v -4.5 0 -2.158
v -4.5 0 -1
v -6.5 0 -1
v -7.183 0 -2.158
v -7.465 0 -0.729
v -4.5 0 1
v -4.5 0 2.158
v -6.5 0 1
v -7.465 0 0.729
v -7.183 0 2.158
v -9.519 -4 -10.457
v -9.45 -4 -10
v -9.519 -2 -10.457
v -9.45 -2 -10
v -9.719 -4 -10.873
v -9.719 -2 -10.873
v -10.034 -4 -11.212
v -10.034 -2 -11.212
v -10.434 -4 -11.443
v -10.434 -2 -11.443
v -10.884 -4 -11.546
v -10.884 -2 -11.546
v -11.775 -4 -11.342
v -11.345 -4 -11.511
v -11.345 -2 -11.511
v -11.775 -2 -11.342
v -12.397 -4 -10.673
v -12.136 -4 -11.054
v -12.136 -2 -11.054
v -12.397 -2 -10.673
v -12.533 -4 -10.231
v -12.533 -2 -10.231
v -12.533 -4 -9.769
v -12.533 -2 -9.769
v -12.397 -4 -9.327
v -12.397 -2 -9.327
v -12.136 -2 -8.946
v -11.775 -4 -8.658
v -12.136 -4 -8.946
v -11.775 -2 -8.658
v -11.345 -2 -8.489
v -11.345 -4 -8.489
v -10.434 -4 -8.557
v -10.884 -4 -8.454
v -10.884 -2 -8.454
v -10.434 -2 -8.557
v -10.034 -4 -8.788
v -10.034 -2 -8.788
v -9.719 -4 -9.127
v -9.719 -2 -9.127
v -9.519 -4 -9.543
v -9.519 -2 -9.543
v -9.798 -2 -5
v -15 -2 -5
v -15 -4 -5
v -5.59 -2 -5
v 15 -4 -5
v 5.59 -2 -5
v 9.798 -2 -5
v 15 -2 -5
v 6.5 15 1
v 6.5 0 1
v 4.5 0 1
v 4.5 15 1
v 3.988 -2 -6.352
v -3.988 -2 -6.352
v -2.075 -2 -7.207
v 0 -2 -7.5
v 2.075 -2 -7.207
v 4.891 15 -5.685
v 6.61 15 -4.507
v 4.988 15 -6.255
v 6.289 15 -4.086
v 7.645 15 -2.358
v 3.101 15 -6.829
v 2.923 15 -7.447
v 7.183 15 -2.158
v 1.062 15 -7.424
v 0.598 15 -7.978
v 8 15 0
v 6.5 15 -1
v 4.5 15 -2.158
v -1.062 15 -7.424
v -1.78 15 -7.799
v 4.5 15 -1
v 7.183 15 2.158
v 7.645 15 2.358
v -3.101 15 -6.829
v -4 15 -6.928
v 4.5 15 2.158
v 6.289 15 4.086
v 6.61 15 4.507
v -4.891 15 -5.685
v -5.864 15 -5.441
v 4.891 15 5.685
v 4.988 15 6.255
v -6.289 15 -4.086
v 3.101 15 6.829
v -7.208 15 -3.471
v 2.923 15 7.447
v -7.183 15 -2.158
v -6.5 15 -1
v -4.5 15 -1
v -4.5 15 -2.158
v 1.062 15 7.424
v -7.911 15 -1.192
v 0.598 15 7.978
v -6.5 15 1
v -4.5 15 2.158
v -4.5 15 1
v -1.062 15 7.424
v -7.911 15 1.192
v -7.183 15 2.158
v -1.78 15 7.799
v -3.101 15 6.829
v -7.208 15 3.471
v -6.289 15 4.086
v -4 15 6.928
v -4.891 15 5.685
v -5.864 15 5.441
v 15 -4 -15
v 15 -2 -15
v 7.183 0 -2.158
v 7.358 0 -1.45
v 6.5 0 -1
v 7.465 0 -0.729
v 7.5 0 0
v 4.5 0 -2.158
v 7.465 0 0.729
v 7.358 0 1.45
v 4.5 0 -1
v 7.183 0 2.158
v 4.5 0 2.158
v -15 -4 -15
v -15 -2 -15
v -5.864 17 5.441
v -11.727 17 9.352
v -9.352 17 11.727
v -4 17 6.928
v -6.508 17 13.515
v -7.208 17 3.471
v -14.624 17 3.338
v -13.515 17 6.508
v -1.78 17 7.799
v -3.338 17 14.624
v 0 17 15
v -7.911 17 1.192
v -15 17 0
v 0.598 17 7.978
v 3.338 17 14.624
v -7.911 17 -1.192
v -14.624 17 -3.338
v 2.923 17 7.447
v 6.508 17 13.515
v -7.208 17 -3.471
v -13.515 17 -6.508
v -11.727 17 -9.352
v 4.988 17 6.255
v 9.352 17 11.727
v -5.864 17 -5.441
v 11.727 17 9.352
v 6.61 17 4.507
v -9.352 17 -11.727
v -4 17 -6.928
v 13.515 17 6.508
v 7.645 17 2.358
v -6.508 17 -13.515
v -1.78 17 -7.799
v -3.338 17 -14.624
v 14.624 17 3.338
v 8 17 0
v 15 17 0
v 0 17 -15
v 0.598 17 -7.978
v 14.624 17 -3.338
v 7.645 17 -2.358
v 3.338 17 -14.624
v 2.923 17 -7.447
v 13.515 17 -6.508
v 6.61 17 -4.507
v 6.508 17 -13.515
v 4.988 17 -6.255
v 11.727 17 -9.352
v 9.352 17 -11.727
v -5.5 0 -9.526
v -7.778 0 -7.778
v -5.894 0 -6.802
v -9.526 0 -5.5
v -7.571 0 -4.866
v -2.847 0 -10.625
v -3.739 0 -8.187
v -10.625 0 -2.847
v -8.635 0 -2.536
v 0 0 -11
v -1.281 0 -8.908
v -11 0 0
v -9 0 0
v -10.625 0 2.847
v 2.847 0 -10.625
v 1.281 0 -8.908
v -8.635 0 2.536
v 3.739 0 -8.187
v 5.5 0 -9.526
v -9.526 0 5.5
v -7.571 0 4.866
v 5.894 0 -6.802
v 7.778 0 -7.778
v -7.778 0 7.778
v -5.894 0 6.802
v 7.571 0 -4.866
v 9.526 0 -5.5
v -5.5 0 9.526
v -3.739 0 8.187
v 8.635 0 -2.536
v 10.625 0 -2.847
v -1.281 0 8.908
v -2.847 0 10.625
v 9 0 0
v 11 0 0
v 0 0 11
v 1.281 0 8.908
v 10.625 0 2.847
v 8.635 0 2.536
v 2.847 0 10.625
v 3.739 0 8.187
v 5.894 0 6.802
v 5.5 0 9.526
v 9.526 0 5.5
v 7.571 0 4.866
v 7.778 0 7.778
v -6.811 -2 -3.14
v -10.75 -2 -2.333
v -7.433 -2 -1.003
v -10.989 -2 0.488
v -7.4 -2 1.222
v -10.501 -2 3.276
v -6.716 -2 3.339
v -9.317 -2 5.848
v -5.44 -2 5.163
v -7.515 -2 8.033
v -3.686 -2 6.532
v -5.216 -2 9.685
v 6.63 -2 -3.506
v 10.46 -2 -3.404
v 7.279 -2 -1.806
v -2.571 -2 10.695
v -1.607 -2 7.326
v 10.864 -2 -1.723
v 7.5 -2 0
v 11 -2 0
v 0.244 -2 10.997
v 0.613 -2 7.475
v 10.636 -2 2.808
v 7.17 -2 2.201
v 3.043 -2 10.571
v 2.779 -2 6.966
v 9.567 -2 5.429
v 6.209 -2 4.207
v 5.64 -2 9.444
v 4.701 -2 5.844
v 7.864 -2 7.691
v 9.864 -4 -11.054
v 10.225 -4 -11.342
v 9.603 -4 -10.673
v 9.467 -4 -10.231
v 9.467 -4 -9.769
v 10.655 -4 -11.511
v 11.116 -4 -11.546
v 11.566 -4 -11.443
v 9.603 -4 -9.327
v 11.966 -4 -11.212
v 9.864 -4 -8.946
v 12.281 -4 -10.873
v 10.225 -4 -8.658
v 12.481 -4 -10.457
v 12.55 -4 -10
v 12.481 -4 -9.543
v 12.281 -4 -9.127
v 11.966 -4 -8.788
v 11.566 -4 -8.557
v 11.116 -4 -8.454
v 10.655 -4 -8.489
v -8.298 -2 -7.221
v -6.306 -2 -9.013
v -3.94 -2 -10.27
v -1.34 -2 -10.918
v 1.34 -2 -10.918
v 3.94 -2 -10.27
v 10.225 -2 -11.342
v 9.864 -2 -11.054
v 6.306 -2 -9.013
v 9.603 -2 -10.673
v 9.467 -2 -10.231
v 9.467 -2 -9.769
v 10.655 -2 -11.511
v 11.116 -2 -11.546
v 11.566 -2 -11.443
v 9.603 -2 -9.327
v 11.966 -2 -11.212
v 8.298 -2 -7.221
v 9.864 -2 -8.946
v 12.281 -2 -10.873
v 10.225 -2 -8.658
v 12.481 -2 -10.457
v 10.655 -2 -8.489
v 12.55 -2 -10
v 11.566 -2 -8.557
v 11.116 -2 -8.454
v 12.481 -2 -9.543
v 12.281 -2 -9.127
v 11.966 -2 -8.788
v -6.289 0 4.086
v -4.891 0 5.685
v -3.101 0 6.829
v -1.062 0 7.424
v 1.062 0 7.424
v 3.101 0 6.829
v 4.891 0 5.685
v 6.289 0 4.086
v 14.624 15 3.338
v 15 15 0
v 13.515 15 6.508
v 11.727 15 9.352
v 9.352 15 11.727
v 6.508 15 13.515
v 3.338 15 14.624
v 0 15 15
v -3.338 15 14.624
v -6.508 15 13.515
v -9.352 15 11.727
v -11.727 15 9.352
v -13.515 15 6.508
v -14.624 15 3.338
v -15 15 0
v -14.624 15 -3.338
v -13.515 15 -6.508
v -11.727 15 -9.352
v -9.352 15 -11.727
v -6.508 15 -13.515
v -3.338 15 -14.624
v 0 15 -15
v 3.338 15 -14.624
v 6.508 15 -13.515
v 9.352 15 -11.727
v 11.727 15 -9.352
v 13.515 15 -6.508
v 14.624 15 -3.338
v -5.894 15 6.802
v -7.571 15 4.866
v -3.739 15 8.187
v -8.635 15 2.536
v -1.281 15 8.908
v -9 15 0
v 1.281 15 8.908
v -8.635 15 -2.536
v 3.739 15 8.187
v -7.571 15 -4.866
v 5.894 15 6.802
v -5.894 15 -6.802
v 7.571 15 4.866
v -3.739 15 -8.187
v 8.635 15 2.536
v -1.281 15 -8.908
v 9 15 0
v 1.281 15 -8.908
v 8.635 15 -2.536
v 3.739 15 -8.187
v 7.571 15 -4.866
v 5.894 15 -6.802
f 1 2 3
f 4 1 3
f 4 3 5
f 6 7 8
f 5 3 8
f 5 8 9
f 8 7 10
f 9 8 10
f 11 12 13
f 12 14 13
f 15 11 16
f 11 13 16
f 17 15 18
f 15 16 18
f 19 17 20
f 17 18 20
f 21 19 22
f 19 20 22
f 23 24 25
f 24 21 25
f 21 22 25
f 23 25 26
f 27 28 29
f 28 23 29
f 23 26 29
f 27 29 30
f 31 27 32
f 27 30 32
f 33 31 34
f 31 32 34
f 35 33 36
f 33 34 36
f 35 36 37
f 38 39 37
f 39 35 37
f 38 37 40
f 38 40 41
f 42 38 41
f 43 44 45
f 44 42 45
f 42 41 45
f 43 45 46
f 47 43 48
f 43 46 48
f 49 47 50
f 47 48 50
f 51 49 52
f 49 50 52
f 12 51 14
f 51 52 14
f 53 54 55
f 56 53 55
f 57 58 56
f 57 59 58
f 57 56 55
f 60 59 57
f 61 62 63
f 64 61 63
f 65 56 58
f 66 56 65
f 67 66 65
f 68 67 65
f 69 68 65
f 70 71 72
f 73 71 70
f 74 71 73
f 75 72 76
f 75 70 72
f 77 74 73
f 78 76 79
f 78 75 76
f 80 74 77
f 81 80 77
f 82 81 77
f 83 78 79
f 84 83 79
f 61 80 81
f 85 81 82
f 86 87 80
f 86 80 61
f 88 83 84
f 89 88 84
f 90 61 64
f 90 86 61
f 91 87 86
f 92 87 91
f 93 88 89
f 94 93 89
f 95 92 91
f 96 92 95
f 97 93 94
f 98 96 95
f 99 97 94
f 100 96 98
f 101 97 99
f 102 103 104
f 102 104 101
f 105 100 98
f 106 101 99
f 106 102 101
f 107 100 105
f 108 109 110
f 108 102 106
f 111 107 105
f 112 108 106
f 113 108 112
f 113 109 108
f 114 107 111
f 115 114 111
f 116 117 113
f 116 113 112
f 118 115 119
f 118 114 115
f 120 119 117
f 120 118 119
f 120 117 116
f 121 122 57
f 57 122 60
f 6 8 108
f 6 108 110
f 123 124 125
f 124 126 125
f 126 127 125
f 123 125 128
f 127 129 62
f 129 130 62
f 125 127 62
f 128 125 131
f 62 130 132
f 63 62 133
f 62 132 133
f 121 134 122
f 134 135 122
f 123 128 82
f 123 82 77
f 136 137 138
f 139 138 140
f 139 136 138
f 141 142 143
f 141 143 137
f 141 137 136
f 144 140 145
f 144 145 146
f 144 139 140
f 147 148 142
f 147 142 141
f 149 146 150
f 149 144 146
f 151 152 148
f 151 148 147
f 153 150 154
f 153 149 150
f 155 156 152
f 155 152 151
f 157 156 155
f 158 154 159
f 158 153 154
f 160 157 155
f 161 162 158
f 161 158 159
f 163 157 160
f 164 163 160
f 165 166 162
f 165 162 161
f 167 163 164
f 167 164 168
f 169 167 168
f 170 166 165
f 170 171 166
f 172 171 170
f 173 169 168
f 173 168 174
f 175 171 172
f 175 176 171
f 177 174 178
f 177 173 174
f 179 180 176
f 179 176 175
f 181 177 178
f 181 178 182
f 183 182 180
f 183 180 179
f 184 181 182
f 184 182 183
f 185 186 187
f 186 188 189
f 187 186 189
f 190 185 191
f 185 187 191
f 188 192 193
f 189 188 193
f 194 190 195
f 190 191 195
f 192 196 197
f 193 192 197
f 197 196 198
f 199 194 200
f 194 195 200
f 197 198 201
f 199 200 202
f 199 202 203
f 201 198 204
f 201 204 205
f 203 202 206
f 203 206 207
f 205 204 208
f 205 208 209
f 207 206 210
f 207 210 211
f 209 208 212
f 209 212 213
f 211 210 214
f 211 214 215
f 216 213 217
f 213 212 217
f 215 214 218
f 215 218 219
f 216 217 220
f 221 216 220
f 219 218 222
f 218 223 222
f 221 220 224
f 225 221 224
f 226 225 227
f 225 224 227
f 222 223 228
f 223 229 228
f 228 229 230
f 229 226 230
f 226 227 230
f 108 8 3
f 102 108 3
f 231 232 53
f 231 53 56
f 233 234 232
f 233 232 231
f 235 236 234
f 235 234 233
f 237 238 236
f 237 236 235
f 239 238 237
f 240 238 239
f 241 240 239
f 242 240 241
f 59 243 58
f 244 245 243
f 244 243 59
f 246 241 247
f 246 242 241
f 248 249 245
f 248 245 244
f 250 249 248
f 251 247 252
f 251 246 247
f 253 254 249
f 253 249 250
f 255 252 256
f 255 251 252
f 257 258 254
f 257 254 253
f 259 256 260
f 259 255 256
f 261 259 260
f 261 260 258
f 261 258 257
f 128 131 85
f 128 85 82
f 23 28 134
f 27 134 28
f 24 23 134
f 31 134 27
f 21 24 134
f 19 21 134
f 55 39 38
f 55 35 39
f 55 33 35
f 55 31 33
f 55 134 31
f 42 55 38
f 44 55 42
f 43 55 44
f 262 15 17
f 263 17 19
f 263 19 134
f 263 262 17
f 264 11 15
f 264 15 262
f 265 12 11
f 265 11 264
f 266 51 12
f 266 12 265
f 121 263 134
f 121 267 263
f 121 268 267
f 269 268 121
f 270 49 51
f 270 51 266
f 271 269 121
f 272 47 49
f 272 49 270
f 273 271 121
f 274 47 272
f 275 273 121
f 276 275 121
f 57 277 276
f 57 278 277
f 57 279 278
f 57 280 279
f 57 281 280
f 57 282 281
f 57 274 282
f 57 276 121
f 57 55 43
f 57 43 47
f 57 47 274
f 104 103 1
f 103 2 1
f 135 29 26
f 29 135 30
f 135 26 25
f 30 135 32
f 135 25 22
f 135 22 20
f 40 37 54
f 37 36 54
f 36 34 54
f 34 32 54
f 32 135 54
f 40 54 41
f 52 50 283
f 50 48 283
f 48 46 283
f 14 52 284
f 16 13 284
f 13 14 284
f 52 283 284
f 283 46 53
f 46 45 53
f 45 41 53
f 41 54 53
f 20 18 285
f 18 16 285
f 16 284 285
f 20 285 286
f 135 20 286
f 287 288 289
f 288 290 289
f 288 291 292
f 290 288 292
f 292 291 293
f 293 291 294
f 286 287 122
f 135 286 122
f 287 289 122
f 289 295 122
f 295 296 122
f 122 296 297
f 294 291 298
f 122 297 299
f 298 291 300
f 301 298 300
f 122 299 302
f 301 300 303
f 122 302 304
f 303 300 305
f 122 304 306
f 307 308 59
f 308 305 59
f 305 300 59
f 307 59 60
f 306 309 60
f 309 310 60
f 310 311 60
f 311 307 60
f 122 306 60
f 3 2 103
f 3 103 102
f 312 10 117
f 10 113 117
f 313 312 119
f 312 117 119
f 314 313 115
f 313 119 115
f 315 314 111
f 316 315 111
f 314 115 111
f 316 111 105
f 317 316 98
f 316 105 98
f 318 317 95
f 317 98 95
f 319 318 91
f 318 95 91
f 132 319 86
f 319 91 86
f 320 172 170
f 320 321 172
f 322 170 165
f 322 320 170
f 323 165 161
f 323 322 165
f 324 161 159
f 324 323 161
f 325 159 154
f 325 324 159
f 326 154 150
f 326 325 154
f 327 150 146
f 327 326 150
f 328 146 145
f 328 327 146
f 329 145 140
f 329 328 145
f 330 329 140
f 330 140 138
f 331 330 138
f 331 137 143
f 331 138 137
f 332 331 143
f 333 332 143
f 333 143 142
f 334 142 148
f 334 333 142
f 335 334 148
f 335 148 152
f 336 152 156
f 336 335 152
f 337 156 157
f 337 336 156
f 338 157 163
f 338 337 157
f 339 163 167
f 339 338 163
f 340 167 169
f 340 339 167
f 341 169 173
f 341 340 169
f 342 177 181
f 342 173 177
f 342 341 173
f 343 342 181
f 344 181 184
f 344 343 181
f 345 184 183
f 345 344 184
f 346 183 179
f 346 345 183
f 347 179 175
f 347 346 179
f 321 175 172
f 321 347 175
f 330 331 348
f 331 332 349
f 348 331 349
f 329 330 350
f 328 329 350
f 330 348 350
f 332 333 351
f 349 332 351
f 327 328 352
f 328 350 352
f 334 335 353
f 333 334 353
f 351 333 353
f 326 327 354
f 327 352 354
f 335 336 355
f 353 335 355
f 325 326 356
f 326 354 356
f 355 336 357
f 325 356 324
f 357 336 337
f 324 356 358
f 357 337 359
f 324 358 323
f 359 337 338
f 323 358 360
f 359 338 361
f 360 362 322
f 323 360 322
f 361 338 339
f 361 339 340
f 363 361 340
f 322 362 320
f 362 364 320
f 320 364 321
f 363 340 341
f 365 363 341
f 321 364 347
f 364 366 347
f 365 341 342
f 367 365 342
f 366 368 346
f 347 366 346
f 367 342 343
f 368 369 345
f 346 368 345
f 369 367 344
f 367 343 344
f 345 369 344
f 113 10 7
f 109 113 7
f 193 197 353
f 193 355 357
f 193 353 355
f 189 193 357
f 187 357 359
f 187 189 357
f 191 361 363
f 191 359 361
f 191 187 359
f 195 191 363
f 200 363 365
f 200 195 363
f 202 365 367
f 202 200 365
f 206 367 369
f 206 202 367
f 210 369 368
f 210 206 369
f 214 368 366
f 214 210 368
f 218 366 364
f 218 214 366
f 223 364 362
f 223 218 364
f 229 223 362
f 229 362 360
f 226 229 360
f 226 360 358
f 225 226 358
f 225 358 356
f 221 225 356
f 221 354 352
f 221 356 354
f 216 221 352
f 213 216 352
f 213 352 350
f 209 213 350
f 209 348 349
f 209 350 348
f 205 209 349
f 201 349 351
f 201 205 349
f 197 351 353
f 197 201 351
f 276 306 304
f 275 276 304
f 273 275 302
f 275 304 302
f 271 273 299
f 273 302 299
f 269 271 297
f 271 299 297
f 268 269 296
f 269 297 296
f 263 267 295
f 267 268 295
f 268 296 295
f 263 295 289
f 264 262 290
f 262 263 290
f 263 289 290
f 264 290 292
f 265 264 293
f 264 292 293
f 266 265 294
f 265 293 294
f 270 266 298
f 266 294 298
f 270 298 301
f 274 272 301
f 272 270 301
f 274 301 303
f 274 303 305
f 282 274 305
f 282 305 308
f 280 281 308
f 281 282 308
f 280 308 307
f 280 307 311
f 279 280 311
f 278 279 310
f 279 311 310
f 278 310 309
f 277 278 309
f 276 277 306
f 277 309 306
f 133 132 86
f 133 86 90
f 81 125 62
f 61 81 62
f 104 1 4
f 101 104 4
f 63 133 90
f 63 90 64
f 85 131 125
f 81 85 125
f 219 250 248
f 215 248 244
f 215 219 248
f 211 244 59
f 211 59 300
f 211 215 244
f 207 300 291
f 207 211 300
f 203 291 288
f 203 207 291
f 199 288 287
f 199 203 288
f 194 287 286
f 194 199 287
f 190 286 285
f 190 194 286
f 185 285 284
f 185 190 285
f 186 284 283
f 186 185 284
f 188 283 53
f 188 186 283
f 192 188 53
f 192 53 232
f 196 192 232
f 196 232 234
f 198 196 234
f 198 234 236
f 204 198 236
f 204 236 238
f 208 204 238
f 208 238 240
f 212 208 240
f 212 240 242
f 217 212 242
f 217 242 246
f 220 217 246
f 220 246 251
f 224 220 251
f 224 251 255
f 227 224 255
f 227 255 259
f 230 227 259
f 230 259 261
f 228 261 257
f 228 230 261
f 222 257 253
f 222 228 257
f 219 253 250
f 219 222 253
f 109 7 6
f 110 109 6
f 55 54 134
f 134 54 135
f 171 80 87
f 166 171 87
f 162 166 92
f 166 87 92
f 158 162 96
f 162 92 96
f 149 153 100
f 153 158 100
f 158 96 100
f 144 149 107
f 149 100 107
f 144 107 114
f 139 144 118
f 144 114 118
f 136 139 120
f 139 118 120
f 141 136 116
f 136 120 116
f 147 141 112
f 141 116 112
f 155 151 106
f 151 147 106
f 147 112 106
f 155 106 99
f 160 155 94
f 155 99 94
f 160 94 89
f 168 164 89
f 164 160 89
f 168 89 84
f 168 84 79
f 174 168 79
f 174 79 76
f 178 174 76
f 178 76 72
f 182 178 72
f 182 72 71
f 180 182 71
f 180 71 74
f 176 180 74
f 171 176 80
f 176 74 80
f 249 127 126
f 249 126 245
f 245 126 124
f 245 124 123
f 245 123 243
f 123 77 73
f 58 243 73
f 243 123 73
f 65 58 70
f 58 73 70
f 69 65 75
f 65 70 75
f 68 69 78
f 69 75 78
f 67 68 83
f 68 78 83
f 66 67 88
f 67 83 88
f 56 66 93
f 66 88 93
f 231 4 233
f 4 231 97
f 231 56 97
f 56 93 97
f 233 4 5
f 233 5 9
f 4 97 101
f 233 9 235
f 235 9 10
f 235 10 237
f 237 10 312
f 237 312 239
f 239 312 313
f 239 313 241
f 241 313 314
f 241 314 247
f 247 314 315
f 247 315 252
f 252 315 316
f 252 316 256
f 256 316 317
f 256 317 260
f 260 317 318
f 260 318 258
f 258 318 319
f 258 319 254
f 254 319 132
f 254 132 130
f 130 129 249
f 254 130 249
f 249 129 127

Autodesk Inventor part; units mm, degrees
ref_plane "YZ Plane" through (0, 0, 0) normal (1, 0, 0) x (0, 1, 0)
ref_plane "XZ Plane" through (0, 0, 0) normal (0, 1, 0) x (-1, 0, 0)
ref_plane "XY Plane" through (0, 0, 0) normal (0, 0, 1) x (1, 0, 0)
sketch "草圖1" plane through (0, 0, 0) normal (0, 1, 0) x (-1, 0, 0)
  circle A0 centre (0, 0) radius 7.5
  circle A1 centre (0, 0) radius 9
  line L0 (7.5, 2.1585) -> (4.5, 2.1585)
  line L1 (4.5, 2.1585) -> (4.5, -2.1585)
  line L2 (4.5, -2.1585) -> (7.5, -2.1585)
  line L3 (7.5, -2.1585) -> (7.5, 2.1585)
  line L4 (7, 1) -> (4.5, 1)
  line L5 (4.5, 1) -> (4.5, -1)
  line L6 (4.5, -1) -> (7, -1)
  line L7 (7, -1) -> (7, 1)
  line L8 (0, 5.058) -> (0, -5.7034)
  line L9 (-7.5, 2.1585) -> (-4.5, 2.1585)
  line L10 (-4.5, 2.1585) -> (-4.5, -2.1585)
  line L11 (-4.5, -2.1585) -> (-7.5, -2.1585)
  line L12 (-7.5, -2.1585) -> (-7.5, 2.1585)
  line L13 (-7, 1) -> (-4.5, 1)
  line L14 (-4.5, -1) -> (-7, -1)
  line L15 (-7, -1) -> (-7, 1)
  point P0 (5.75, -1)
  point P1 (7.5, 0)
  point P2 (-7.1827, 2.1585)
  point P3 (7.1827, 2.1585)
  point P4 (4.5, 1)
  point P5 (7.1827, -2.1585)
  point P6 (-7.1827, -2.1585)
  point P7 (-4.5, 1)
  dimension "d0" = 15
  dimension "d1" = 18
  dimension "d2" = 2
  dimension "d3" = 1
  dimension "d4" = 0
  dimension "d5" = 2.5
  dimension "d28" = 3
extrude "擠出1" add sketch "草圖1" along normal blind 15 contours A0 L2 L1 L6 L7 L4 L0 | L3 L2 A0 | A0 L0 L3 | L9 L10 L13 L15 L14 L11 A0 | A0 L12 L9 | L11 L12 A0 | A1
sketch "草圖2" plane through (0, 15, 0) normal (0, 1, 0) x (1, 0, 0)
  circle A0 centre (0, 0) radius 15
  circle A1 centre (0, 0) radius 8
  dimension "d8" = 30
  dimension "d23" = 16
extrude "擠出2" add sketch "草圖2" along normal blind 2
sketch "草圖3" plane through (0, 0, 0) normal (0, -1, 0) x (1, 0, 0)
  circle A0 centre (0, 0) radius 11
  line L0 (-4.5, -2.1585) -> (-7.1827, -2.1585) projected
  circle A1 centre (0, 0) radius 7.5
extrude "擠出3" add sketch "草圖3" along normal blind 2
sketch "草圖4" plane through (0, -2, 0) normal (0, -1, 0) x (1, 0, 0)
  line L0 (-15, -15) -> (15, -15)
  line L1 (15, -15) -> (15, -5)
  line L2 (-15, -5) -> (-15, -15)
  circle A0 centre (0, 0) radius 7.5 projected
  circle A1 centre (11, -10) radius 1.55
  circle A2 centre (-11, -10) radius 1.55
  line L3 (-15, -5) -> (15, -5)
  point P0 (0, -15)
  point P1 (-15, -10)
  point P2 (15, -10)
  dimension "d13" = 30
  dimension "d14" = 0
  dimension "d15" = 10
  dimension "d16" = 3.1
  dimension "d17" = 3.1
  dimension "d18" = 11
  dimension "d19" = 11
  dimension "d22" = 5
extrude "擠出4" add sketch "草圖4" along normal blind 2 contours L2 L3 A0 L1 L0 | L3 A0 picked at (1.4132, -5.3956)
sketch "草圖5" plane through (0, 0, 0) normal (0, -1, 0) x (1, 0, 0)
  line L0 (7, -1) -> (7, 1) projected
  line L1 (7, 1) -> (4.5, 1) projected
  line L2 (7, -1) -> (6.5, -1)
  line L3 (6.5, -1) -> (6.5, 1)
  line L4 (6.5, 1) -> (7, 1)
  line L5 (7, 1) -> (7, -1)
  line L6 (-7, -1) -> (-4.5, -1) projected
  line L7 (-7, 1) -> (-7, -1) projected
  line L8 (-6.5, -1) -> (-7, -1)
  line L9 (-7, -1) -> (-7, 1)
  line L10 (-7, 1) -> (-6.5, 1)
  line L11 (-6.5, 1) -> (-6.5, -1)
  point P0 (0, 0)
  dimension "d24" = 0.5
  dimension "d25" = 0.5
extrude "擠出5" add sketch "草圖5" against normal blind 15
properties part number "tmrEXCI"
